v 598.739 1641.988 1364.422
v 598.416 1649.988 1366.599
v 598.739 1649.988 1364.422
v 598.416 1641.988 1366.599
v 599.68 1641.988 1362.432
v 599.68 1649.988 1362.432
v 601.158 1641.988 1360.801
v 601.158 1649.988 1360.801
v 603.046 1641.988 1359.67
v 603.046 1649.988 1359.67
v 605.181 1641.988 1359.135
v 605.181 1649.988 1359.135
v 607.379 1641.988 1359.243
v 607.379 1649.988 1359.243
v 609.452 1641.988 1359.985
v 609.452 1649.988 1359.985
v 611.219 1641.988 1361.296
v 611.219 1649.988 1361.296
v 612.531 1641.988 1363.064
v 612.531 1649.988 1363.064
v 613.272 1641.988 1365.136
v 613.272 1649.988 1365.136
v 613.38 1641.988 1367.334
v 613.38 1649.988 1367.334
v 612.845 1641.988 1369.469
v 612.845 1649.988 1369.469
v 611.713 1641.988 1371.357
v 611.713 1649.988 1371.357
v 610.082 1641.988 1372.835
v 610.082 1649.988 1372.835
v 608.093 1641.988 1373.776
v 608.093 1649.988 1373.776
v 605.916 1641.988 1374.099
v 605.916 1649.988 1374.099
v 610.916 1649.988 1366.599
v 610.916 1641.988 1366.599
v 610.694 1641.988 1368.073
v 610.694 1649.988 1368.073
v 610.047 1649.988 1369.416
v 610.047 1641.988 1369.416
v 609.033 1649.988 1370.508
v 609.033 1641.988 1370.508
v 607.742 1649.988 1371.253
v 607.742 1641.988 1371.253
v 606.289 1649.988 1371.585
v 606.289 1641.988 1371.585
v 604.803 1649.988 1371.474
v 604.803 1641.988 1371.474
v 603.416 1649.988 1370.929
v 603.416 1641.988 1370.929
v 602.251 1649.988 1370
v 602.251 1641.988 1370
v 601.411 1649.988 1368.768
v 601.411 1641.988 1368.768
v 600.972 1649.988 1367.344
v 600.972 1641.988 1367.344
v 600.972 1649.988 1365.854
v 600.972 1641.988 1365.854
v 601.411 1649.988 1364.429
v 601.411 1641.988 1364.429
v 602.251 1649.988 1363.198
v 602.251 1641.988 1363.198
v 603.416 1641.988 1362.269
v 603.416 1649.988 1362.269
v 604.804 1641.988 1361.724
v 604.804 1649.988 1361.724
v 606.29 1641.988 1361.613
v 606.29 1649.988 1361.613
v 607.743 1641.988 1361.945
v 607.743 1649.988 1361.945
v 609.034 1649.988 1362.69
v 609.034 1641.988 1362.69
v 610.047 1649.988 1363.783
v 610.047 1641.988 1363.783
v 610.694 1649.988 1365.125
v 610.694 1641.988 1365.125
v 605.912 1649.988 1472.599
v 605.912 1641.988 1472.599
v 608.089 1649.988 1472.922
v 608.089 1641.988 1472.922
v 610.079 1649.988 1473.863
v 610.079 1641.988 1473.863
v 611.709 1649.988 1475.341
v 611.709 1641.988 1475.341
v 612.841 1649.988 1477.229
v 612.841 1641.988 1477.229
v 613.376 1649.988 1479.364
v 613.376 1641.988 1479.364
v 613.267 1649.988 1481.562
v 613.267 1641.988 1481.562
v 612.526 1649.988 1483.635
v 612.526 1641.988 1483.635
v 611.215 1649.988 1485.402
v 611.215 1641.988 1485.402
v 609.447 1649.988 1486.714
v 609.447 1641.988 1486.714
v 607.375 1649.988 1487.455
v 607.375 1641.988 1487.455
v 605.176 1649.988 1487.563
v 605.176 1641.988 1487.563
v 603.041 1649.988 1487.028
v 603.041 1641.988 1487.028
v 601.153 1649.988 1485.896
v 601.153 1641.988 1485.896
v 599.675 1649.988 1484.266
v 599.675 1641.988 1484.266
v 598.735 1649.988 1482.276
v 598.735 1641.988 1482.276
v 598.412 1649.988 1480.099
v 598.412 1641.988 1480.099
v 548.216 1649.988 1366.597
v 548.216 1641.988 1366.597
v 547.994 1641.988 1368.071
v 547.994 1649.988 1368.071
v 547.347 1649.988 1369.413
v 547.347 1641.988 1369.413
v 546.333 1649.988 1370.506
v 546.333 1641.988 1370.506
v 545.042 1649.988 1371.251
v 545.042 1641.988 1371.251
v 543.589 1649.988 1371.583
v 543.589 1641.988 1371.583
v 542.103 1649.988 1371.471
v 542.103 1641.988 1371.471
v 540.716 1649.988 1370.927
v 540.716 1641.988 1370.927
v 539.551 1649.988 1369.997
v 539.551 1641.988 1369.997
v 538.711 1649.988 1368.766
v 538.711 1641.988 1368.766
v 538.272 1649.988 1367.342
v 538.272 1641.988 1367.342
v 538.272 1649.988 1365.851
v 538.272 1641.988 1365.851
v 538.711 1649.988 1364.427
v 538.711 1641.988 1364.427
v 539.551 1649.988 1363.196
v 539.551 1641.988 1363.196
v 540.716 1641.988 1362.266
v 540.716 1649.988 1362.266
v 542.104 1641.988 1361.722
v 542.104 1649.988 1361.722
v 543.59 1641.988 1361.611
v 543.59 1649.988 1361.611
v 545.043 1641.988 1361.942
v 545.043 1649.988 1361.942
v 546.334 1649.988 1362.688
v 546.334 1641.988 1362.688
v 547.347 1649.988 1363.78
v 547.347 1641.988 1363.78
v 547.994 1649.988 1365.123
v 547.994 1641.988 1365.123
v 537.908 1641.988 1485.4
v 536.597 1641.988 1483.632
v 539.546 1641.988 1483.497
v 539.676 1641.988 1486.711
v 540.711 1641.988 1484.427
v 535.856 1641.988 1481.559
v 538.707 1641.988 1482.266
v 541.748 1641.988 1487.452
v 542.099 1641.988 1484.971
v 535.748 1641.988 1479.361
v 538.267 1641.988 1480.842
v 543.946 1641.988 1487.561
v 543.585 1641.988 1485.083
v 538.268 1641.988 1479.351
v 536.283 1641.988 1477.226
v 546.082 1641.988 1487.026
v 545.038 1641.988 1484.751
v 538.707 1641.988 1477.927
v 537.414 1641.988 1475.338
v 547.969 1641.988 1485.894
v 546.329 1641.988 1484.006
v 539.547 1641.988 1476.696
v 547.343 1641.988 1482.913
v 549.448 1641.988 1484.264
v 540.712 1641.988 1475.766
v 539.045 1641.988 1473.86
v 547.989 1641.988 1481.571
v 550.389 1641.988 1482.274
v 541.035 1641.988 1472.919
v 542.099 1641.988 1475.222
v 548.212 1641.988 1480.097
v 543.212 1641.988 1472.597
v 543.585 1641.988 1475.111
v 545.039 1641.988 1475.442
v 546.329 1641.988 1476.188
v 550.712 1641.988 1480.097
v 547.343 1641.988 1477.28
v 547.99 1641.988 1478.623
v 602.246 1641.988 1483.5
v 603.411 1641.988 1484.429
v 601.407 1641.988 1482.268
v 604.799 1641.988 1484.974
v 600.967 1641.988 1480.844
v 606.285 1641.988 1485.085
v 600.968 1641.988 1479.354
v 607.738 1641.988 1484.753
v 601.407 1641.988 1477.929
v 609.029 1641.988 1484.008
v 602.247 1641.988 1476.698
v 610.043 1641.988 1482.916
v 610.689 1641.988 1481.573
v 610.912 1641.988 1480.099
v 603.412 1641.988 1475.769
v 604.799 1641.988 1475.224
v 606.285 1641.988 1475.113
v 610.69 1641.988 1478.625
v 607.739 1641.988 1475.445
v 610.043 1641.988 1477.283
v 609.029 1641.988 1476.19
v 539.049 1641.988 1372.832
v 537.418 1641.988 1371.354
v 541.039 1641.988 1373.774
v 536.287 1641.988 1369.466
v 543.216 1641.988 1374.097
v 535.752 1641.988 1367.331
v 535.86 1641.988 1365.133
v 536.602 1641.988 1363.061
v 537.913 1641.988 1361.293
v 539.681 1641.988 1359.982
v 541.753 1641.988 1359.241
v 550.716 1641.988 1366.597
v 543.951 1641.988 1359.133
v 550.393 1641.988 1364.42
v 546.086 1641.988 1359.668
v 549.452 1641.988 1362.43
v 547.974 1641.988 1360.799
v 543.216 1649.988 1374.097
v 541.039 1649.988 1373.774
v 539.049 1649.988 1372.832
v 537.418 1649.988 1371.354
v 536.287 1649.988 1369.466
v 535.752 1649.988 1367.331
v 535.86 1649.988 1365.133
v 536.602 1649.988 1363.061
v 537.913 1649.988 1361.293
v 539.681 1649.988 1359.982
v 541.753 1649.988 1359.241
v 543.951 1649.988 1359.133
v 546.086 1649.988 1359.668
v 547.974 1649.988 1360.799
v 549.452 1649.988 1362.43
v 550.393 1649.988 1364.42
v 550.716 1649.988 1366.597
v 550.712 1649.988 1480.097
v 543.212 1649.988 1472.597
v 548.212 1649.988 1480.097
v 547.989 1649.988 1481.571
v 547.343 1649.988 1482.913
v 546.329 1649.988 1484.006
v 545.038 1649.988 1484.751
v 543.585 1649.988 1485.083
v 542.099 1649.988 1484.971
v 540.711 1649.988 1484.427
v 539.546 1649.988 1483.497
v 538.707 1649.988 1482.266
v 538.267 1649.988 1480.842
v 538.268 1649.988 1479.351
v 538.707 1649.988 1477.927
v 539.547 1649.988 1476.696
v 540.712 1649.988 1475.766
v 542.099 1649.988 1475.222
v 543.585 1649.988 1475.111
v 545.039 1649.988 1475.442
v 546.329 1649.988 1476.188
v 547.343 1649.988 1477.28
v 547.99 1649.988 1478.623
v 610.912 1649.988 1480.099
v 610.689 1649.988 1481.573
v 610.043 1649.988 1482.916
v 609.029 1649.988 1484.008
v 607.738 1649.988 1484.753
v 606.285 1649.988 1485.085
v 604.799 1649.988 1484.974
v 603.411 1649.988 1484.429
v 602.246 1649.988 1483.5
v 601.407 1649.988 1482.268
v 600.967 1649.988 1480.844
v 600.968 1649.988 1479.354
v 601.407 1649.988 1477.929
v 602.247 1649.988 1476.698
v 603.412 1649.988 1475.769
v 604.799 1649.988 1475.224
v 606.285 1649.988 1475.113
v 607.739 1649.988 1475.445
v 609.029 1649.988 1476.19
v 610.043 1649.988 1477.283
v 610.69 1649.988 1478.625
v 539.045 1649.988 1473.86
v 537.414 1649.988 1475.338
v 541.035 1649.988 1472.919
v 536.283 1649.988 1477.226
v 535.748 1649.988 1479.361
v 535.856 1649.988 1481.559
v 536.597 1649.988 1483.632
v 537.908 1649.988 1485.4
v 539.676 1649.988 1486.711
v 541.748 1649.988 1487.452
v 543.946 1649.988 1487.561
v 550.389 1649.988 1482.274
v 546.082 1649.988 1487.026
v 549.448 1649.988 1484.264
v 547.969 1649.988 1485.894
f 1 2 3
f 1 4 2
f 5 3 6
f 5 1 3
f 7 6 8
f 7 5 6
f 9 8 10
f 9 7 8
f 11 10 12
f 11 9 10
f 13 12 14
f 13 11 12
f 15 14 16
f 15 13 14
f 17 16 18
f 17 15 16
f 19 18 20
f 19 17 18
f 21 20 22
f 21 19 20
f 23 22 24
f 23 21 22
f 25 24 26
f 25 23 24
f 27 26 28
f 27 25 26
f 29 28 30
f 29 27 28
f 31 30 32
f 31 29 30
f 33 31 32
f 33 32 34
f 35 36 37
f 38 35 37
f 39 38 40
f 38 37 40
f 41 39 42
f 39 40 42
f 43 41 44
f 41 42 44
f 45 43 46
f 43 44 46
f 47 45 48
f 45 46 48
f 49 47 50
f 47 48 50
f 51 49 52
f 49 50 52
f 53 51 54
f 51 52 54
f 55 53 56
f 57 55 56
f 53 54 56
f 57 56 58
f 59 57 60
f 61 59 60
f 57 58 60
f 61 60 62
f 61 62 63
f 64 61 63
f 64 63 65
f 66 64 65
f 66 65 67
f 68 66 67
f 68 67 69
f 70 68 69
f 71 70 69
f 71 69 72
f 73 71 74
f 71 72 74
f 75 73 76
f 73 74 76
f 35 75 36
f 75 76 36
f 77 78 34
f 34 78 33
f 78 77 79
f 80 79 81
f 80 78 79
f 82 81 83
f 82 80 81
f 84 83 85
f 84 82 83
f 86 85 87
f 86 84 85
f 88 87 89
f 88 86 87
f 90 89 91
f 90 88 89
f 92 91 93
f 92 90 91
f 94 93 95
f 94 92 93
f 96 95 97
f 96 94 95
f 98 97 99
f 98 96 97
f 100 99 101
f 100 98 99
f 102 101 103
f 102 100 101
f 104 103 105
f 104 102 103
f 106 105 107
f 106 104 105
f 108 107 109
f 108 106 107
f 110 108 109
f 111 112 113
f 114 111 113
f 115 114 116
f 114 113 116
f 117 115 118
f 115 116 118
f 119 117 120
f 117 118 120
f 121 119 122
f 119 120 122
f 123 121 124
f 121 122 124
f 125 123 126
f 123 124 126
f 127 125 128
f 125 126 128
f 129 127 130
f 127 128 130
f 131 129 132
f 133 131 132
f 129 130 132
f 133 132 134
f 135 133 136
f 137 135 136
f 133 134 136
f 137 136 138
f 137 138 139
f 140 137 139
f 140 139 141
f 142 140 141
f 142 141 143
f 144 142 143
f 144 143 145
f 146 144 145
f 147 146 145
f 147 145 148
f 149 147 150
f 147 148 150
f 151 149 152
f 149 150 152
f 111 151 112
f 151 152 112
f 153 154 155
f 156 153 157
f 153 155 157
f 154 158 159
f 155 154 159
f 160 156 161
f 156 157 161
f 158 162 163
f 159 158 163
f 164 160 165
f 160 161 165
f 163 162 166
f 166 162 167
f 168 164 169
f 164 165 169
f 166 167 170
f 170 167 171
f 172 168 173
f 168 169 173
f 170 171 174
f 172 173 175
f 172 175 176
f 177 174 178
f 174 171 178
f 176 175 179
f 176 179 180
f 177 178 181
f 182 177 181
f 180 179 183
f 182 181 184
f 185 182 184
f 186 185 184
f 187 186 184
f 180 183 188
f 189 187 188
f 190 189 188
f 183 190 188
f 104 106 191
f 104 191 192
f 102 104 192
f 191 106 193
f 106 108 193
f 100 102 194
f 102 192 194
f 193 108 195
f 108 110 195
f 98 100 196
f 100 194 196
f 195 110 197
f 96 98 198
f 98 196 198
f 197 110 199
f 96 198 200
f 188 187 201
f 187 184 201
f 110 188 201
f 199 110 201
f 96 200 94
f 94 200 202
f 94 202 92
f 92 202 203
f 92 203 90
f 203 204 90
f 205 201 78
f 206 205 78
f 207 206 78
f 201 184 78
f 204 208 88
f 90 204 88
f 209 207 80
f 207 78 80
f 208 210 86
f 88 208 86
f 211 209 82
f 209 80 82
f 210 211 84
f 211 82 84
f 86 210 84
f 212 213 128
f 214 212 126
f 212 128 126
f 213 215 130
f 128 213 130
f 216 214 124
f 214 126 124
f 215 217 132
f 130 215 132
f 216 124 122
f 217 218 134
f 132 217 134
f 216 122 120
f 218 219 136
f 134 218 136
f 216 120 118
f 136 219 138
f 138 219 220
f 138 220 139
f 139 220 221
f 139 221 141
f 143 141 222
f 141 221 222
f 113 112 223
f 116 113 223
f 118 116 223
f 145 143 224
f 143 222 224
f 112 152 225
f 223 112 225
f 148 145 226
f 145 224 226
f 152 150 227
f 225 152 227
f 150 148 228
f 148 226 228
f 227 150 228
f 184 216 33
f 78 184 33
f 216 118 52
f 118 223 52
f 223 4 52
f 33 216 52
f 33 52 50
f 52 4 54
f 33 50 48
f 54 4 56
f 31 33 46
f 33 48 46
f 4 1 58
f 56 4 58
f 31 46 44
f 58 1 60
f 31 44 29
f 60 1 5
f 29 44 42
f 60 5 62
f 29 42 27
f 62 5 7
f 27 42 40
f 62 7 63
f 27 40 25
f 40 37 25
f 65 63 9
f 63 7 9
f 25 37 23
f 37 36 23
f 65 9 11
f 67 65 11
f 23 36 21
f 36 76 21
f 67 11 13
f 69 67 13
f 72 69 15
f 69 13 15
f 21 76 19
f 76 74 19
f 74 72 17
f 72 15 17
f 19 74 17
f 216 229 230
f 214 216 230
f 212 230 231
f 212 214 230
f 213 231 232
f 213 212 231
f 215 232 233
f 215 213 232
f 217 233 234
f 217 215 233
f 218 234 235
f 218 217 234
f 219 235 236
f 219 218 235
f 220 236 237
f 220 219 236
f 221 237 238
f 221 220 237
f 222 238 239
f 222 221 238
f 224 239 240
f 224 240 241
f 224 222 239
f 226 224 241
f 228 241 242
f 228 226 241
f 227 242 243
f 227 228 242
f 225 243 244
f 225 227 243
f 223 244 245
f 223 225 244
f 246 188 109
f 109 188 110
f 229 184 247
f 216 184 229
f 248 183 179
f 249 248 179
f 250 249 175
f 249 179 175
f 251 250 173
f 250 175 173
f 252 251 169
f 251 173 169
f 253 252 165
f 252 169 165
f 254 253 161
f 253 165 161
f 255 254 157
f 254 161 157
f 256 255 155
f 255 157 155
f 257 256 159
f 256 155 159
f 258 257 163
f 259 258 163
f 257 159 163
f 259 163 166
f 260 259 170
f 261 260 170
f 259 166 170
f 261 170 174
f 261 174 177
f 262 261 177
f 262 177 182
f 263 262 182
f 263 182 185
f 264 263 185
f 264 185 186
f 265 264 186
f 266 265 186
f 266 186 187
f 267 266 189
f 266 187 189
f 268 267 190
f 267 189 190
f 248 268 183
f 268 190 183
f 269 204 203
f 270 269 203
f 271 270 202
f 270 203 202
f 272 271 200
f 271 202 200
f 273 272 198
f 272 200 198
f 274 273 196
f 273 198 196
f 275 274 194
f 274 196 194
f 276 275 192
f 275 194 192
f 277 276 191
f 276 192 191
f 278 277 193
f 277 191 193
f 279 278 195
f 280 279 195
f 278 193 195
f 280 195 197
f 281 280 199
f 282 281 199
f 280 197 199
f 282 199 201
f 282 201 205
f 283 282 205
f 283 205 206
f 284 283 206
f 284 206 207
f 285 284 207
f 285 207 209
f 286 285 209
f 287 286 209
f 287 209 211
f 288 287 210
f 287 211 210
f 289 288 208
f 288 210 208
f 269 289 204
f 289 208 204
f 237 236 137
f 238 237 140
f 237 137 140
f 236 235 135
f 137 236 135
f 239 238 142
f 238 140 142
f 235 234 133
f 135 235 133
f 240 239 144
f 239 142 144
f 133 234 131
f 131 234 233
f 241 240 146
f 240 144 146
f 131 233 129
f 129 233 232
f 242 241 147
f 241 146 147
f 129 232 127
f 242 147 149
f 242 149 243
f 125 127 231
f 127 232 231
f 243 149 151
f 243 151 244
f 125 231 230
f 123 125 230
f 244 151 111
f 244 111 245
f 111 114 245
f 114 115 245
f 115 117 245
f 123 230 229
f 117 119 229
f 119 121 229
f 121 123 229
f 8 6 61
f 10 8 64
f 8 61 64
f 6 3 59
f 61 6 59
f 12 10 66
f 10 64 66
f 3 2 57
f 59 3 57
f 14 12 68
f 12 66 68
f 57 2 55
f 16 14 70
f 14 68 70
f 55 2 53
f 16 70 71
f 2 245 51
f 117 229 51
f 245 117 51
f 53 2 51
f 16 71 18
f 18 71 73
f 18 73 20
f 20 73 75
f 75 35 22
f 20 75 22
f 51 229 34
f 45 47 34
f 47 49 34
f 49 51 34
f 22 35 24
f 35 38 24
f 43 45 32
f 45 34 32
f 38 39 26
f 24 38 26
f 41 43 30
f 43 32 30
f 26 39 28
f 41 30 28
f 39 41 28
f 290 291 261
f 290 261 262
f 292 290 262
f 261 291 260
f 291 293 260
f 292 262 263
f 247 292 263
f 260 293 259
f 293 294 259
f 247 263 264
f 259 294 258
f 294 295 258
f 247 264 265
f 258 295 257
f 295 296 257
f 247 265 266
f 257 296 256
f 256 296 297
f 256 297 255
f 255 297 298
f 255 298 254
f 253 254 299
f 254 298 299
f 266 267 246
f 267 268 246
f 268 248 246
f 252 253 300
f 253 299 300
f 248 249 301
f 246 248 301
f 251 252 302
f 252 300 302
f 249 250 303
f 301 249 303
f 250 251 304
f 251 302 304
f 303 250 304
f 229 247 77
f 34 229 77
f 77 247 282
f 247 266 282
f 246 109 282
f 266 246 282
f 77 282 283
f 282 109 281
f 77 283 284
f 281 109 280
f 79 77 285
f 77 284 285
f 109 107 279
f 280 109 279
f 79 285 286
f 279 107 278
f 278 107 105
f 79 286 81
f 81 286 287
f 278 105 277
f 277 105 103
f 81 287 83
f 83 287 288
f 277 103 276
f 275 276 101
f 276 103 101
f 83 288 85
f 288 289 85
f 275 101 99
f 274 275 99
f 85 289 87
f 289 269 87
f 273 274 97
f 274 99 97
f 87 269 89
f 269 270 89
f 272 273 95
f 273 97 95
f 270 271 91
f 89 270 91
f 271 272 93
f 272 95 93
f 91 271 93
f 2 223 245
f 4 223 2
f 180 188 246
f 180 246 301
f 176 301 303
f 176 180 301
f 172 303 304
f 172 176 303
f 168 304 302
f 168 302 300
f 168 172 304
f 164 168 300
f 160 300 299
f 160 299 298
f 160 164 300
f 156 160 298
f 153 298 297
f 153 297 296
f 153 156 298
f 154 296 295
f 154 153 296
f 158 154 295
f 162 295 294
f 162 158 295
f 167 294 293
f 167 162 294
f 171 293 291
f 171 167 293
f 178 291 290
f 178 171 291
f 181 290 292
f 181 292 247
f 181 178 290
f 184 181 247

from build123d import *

# Parameters (mm, degrees)
SKETCH1_W           = 62.7
SKETCH1_H           = 113.5
BOSS_EXTRUDE1_DEPTH = 8
SKETCH2_R           = 7.5
BOSS_EXTRUDE2_DEPTH = 8
SKETCH3_R           = 5
CUT_EXTRUDE1_DEPTH  = 8


with BuildPart() as part:
    # Sketch1 → Boss-Extrude1 (new body)
    with BuildSketch(Plane(origin=(-3.563e-06, 1641.987881811, -1.519e-06), x_dir=(0.999999999, 2e-09, 3.7953e-05), z_dir=(-2e-09, 1, -1e-09))):
        with Locations((574.61782777, -1423.325985679)):
            Rectangle(SKETCH1_W, SKETCH1_H)
    extrude(amount=BOSS_EXTRUDE1_DEPTH)

    # Sketch2 → Boss-Extrude2 (add)
    with BuildSketch(Plane(origin=(-3.563e-06, 1641.987881811, -1.519e-06), x_dir=(0.999999999, 2e-09, 3.7953e-05), z_dir=(2e-09, -1, 1e-09))):
        with Locations((543.26782777, 1366.575985679)):
            Circle(SKETCH2_R)
        with Locations((605.96782777, 1366.575985679)):
            Circle(SKETCH2_R)
        with Locations((605.96782777, 1480.075985679)):
            Circle(SKETCH2_R)
        with Locations((543.26782777, 1480.075985679)):
            Circle(SKETCH2_R)
    extrude(amount=-BOSS_EXTRUDE2_DEPTH)

    # Sketch3 → Cut-Extrude1 (cut)
    with BuildSketch(Plane(origin=(-3.563e-06, 1641.987881811, -1.519e-06), x_dir=(0.999999999, 2e-09, 3.7953e-05), z_dir=(2e-09, -1, 1e-09))):
        with Locations((543.26782777, 1480.075985679)):
            Circle(SKETCH3_R)
        with Locations((605.96782777, 1480.075985679)):
            Circle(SKETCH3_R)
        with Locations((605.96782777, 1366.575985679)):
            Circle(SKETCH3_R)
        with Locations((543.26782777, 1366.575985679)):
            Circle(SKETCH3_R)
    extrude(amount=-CUT_EXTRUDE1_DEPTH, mode=Mode.SUBTRACT)


solid = part.part
